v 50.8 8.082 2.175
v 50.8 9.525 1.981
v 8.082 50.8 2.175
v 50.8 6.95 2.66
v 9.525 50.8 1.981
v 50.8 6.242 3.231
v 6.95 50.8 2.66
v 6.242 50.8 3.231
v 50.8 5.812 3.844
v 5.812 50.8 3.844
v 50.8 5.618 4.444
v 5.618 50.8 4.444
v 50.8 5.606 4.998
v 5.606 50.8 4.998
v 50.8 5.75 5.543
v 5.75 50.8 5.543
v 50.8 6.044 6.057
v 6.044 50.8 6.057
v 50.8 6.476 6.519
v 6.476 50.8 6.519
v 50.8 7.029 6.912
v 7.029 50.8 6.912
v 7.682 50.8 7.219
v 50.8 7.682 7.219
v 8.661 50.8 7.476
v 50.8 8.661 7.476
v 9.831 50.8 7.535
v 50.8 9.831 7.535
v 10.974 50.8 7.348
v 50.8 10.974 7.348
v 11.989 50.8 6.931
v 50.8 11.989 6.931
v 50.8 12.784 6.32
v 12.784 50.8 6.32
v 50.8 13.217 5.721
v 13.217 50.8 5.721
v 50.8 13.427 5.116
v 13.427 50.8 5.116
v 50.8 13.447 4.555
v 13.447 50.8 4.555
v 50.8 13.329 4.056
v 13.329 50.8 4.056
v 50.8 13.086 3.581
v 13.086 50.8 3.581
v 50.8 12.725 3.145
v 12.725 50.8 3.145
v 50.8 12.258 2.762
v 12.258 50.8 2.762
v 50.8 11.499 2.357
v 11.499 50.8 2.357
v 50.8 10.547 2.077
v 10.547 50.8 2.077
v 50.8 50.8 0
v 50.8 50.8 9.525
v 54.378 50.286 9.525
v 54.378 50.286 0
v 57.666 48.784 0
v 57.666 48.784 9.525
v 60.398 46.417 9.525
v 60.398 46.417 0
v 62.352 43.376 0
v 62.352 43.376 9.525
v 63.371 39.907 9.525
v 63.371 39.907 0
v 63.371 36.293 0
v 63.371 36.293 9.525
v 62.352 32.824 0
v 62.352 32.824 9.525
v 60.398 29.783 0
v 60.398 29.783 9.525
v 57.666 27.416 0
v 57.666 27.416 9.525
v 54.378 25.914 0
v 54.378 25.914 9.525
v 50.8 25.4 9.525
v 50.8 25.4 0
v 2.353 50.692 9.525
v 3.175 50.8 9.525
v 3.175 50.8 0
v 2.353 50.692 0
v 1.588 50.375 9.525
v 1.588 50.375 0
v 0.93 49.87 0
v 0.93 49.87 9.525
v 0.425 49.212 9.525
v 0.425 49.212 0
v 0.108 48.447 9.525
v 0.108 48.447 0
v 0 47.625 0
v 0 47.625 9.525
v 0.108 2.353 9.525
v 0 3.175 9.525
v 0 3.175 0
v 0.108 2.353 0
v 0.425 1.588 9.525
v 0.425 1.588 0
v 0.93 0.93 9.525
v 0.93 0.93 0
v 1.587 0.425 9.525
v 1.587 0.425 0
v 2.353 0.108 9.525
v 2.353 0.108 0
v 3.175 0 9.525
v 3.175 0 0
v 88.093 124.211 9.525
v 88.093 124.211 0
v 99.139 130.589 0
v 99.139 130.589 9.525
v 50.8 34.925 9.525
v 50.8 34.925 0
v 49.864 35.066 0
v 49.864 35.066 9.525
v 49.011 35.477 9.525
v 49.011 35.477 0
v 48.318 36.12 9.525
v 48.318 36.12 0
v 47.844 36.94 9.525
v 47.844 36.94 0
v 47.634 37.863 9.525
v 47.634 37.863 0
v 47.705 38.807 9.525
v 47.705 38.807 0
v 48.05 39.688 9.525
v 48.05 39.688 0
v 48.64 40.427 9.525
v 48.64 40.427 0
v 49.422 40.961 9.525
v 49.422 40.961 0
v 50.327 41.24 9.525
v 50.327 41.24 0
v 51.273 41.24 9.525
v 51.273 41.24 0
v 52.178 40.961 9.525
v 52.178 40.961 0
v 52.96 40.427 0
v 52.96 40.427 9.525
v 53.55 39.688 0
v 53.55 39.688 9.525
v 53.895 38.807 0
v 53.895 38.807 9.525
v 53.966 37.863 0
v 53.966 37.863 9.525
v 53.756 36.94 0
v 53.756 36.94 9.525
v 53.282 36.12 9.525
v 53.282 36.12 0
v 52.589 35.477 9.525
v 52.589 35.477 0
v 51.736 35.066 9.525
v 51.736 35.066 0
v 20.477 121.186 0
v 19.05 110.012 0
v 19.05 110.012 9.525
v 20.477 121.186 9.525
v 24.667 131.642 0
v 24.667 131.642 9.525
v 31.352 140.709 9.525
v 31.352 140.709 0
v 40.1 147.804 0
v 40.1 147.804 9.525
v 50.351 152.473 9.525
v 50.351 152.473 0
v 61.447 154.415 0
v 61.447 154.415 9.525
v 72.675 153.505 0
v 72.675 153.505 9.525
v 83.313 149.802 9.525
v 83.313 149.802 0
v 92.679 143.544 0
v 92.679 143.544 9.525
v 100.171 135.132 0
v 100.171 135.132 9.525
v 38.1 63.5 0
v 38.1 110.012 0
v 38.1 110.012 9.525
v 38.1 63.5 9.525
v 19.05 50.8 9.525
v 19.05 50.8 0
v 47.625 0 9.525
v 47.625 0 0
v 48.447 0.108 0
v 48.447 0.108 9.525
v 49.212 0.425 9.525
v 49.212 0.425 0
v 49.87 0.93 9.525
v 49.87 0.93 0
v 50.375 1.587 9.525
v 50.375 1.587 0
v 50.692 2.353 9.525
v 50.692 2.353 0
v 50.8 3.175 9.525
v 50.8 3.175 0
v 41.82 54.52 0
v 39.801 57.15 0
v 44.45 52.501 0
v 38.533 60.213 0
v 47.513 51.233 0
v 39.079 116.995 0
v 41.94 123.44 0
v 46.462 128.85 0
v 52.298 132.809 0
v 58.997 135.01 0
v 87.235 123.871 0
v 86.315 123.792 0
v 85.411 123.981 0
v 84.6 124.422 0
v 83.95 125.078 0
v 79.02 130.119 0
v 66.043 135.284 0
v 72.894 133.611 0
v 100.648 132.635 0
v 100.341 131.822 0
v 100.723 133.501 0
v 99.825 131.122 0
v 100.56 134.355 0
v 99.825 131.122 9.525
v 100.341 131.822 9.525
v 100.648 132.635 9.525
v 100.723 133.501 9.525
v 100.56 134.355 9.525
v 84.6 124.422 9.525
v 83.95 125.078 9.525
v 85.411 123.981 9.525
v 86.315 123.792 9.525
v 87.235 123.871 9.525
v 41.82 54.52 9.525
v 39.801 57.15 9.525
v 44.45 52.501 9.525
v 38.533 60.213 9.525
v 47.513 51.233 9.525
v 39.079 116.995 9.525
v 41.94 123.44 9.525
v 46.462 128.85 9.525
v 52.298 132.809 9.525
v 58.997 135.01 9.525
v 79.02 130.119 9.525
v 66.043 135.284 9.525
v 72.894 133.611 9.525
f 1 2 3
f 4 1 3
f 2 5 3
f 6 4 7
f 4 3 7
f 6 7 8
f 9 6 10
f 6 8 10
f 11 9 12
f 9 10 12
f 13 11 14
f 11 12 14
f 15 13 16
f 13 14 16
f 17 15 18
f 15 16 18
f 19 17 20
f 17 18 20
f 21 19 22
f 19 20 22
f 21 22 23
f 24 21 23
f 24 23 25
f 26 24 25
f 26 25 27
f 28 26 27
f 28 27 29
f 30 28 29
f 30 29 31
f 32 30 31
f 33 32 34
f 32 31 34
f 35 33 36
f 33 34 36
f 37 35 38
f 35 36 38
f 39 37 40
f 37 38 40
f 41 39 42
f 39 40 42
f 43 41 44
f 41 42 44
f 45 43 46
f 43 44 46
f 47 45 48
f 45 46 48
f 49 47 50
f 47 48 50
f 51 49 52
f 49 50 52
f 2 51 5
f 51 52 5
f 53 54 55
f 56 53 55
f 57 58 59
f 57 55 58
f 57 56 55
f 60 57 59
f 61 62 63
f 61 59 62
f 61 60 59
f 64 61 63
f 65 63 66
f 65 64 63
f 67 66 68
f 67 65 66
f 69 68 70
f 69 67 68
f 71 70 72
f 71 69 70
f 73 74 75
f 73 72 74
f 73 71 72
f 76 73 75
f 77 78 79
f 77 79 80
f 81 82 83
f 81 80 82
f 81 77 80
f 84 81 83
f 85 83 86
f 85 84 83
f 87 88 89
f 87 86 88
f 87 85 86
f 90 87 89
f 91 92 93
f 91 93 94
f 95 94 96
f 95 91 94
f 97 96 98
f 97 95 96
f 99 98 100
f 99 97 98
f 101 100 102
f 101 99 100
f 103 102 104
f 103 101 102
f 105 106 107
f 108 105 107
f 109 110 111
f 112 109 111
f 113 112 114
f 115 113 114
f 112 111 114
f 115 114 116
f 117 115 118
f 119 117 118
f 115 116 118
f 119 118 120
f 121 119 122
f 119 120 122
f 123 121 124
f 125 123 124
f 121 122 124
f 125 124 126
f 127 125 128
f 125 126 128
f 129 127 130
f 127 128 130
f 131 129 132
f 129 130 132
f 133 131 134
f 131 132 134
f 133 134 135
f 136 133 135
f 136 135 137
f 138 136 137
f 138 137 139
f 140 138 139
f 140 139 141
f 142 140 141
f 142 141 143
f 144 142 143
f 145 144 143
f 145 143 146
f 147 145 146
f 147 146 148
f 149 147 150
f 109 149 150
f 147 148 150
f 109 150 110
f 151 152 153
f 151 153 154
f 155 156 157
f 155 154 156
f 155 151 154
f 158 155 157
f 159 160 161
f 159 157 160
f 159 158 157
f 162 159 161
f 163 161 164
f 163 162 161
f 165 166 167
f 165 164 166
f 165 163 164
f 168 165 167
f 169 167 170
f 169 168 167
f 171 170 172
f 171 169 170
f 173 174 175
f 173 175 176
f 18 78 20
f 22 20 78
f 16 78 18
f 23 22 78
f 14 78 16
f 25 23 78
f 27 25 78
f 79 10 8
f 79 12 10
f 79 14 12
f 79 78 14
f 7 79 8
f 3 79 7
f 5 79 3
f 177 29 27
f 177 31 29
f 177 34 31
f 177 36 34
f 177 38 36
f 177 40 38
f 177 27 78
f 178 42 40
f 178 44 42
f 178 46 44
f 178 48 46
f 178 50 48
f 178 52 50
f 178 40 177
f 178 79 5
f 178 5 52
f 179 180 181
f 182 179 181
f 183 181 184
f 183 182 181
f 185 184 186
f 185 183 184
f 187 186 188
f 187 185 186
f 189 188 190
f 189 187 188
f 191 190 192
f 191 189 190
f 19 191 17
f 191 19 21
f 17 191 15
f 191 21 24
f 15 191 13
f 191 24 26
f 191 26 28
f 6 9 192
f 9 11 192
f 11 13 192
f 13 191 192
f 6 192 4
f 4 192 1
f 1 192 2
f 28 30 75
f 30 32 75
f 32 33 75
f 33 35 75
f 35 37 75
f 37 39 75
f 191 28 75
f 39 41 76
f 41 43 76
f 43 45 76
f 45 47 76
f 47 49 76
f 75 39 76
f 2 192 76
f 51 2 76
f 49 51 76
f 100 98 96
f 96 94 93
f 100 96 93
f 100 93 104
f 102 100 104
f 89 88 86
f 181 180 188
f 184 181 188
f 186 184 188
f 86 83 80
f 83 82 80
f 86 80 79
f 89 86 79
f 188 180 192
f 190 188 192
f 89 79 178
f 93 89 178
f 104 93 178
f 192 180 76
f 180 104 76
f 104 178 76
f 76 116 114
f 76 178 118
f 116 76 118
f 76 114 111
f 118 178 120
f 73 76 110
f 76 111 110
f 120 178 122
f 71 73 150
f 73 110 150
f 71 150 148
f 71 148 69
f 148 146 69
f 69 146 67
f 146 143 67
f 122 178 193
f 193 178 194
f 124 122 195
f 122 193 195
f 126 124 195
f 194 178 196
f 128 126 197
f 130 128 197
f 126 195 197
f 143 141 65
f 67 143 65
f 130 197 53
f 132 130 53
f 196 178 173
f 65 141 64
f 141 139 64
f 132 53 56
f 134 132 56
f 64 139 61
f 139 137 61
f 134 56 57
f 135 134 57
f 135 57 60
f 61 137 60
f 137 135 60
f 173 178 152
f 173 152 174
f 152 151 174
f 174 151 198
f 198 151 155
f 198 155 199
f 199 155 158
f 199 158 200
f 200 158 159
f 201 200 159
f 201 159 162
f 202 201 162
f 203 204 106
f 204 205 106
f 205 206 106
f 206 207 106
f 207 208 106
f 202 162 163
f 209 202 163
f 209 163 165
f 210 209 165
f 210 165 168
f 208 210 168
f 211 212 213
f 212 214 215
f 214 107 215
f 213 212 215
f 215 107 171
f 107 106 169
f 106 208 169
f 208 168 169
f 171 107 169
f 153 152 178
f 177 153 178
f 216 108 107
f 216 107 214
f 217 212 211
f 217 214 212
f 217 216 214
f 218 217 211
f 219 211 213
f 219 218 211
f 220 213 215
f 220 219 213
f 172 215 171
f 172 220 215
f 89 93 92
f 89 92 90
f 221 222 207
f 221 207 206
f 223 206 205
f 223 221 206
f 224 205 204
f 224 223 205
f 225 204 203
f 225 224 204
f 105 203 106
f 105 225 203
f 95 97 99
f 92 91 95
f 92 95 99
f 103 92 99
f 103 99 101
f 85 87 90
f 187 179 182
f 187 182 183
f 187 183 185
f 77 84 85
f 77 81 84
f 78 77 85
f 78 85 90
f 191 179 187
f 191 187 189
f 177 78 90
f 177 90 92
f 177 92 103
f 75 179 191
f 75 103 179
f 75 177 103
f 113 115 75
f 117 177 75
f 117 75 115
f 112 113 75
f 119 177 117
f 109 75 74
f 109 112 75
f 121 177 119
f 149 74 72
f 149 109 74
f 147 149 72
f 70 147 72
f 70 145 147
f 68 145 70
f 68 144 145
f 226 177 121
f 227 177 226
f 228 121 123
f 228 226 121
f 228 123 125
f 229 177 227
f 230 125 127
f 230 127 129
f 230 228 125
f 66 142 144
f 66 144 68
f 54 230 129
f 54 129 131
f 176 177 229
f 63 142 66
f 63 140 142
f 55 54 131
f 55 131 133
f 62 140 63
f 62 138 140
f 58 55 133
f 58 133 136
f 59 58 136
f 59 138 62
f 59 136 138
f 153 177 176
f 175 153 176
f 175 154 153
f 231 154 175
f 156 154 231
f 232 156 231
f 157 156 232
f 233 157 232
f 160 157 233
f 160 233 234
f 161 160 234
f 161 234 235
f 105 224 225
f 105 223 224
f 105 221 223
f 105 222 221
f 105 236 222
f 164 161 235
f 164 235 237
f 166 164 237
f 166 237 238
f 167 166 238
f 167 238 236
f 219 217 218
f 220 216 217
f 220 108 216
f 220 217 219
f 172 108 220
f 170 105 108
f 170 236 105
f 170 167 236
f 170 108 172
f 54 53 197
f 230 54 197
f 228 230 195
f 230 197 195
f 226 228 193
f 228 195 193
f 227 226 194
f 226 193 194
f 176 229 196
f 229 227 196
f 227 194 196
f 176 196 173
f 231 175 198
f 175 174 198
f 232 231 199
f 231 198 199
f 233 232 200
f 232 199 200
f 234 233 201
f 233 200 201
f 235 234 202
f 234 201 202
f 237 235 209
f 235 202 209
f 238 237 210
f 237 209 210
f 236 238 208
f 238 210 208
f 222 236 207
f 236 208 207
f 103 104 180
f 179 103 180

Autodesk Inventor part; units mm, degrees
ref_plane "YZ Plane" through (0, 0, 0) normal (1, 0, 0) x (0, 1, 0)
ref_plane "XZ Plane" through (0, 0, 0) normal (0, 1, 0) x (-1, 0, 0)
ref_plane "XY Plane" through (0, 0, 0) normal (0, 0, 1) x (1, 0, 0)
sketch "Sketch1" plane through (0, 0, 0) normal (0, 0, 1) x (1, 0, 0)
  line L0 (0, 0) -> (50.8, 0)
  line L1 (0, 0) -> (0, 50.8)
  line L2 (0, 50.8) -> (19.05, 50.8)
  arc A0 (101.9948, 132.2372) -> (19.05, 110.0122) centre (63.5, 110.0122) ccw
  arc A1 (85.497, 122.7122) -> (38.1, 110.0122) centre (63.5, 110.0122) ccw
  line L3 (85.497, 122.7122) -> (101.9948, 132.2372)
  line L4 (19.05, 110.0122) -> (19.05, 50.8)
  line L5 (38.1, 110.0122) -> (38.1, 63.5)
  arc A2 (50.8, 25.4) -> (50.8, 50.8) centre (50.8, 38.1) ccw
  arc A3 (38.1, 63.5) -> (50.8, 50.8) centre (50.8, 63.5) ccw
  line L6 (50.8, 0) -> (50.8, 25.4)
  dimension "d5" = 25.4
  dimension "d6" = 44.45
  dimension "d38" = 50.8
  dimension "d65" = 30
  dimension "d84" = 12.7
  dimension "d85" = 12.7
  dimension "d89" = 73.025
  dimension "d90" = 19.05
  dimension "d99" = 0
  dimension "d123" = 50.8
  dimension "d124" = 25.4
extrude "Extrusion1" add sketch "Sketch1" along normal blind 9.525
sketch "Sketch11" plane through (0, 0, 9.525) normal (0, 0, 1) x (1, 0, 0)
  line L0 (0, 0) -> (50.8, 0) projected
  arc A0 (50.8, 25.4) -> (50.8, 50.8) centre (50.8, 38.1) ccw projected
  arc A1 (38.1, 63.5) -> (50.8, 50.8) centre (50.8, 63.5) ccw projected
  line L1 (38.1, 63.5) -> (38.1, 110.0122) projected
  arc A2 (85.497, 122.7122) -> (38.1, 110.0122) centre (63.5, 110.0122) ccw projected
  line L2 (85.497, 122.7122) -> (101.9948, 132.2372) projected
  arc A3 (101.9948, 132.2372) -> (19.05, 110.0122) centre (63.5, 110.0122) ccw projected
  line L3 (19.05, 110.0122) -> (19.05, 50.8) projected
  line L4 (19.05, 50.8) -> (0, 50.8) projected
  line L5 (0, 50.8) -> (0, 0) projected
  line L6 (50.8, 0) -> (50.8, 25.4) projected
hole "Hole3" at (50.8, 38.1, 9.525) direction (0, 0, -1) diameter 6.35 end through all
sketch "Sketch12" plane through (0, 50.8, 0) normal (0, 1, 0) x (1, 0, 0)
  line L0 (19.05, 0) -> (0, 0) projected
  line L1 (0, 0) -> (0, -9.525) projected
  line L2 (19.05, -9.525) -> (0, -9.525) projected
  line L3 (19.05, 0) -> (19.05, -9.525) projected
  point P0 (9.525, -4.7625)
  dimension "d108" = 4.7625
  dimension "d109" = 4.7625
  dimension "d110" = 9.525
sketch "Sketch14" plane through (50.8, 0, 0) normal (1, 0, 0) x (0, 0, -1)
  line L0 (0, 0) -> (0, 25.4) projected
  line L1 (0, 25.4) -> (-9.525, 25.4) projected
  line L2 (-9.525, 0) -> (-9.525, 25.4) projected
  line L3 (0, 0) -> (-9.525, 0) projected
  point P0 (-4.7625, 9.525)
  dimension "d125" = 4.7625
  dimension "d126" = 4.7625
  dimension "d127" = 9.525
hole "Hole5" at (50.8, 9.525, 4.7625) direction (-0.7071, 0.7071, 0) diameter 5.5626 end through all both
fillet "Fillet7" radius 3.175 5 edges at (50.8, 0, 4.7625) (0, 0, 4.7625) (0, 50.8, 4.7625) (85.497, 122.7122, 4.7625) (101.9948, 132.2372, 4.7625)
sketch "Sketch15" plane through (0, 0, 9.525) normal (0, 0, 1) x (1, 0, 0)
  arc A0 (99.1393, 130.5885) -> (100.1712, 135.1325) centre (97.5518, 133.3382) ccw projected
  arc A1 (100.1712, 135.1325) -> (19.05, 110.0122) centre (63.5, 110.0122) ccw projected
  line L0 (19.05, 110.0122) -> (19.05, 50.8) projected
  line L1 (19.05, 50.8) -> (3.175, 50.8) projected
  arc A2 (3.175, 50.8) -> (0, 47.625) centre (3.175, 47.625) ccw projected
  line L2 (0, 47.625) -> (0, 3.175) projected
  arc A3 (0, 3.175) -> (3.175, 0) centre (3.175, 3.175) ccw projected
  line L3 (3.175, 0) -> (47.625, 0) projected
  arc A4 (47.625, 0) -> (50.8, 3.175) centre (47.625, 3.175) ccw projected
  line L4 (50.8, 3.175) -> (50.8, 25.4) projected
  arc A5 (50.8, 25.4) -> (50.8, 50.8) centre (50.8, 38.1) ccw projected
  arc A6 (38.1, 63.5) -> (50.8, 50.8) centre (50.8, 63.5) ccw projected
  line L5 (38.1, 63.5) -> (38.1, 110.0122) projected
  arc A7 (83.9497, 125.0777) -> (38.1, 110.0122) centre (63.5, 110.0122) ccw projected
  arc A8 (83.9497, 125.0777) -> (88.0934, 124.2112) centre (86.5059, 126.9608) ccw projected
  line L6 (88.0934, 124.2112) -> (99.1393, 130.5885) projected
  circle A9 centre (50.8, 38.1) radius 3.175 projected
  line L7 (-3.175, 3.175) -> (-3.175, 47.625)
  arc A10 (3.175, 53.975) -> (-3.175, 47.625) centre (3.175, 47.625) ccw
  line L8 (3.175, 53.975) -> (15.875, 53.975)
  line L9 (15.875, 53.975) -> (15.875, 110.0122)
  arc A11 (102.7905, 136.9268) -> (15.875, 110.0122) centre (63.5, 110.0122) ccw
  arc A12 (100.7268, 127.8389) -> (102.7905, 136.9268) centre (97.5518, 133.3382) ccw
  line L10 (100.7268, 127.8389) -> (89.6809, 121.4616)
  arc A13 (81.3935, 123.1945) -> (89.6809, 121.4616) centre (86.5059, 126.9608) ccw
  arc A14 (81.3935, 123.1945) -> (41.275, 110.0122) centre (63.5, 110.0122) ccw
  line L11 (41.275, 110.0122) -> (41.275, 63.5)
  arc A15 (41.275, 63.5) -> (50.8, 53.975) centre (50.8, 63.5) ccw
  arc A16 (53.975, 22.5457) -> (50.8, 53.975) centre (50.8, 38.1) ccw
  line L12 (53.975, 22.5457) -> (53.975, 3.175)
  arc A17 (47.625, -3.175) -> (53.975, 3.175) centre (47.625, 3.175) ccw
  line L13 (47.625, -3.175) -> (3.175, -3.175)
  arc A18 (-3.175, 3.175) -> (3.175, -3.175) centre (3.175, 3.175) ccw
  point P0 (0, 0)
  dimension "d138" = 3.175
properties part number "CLB_041_ScissorHook"
